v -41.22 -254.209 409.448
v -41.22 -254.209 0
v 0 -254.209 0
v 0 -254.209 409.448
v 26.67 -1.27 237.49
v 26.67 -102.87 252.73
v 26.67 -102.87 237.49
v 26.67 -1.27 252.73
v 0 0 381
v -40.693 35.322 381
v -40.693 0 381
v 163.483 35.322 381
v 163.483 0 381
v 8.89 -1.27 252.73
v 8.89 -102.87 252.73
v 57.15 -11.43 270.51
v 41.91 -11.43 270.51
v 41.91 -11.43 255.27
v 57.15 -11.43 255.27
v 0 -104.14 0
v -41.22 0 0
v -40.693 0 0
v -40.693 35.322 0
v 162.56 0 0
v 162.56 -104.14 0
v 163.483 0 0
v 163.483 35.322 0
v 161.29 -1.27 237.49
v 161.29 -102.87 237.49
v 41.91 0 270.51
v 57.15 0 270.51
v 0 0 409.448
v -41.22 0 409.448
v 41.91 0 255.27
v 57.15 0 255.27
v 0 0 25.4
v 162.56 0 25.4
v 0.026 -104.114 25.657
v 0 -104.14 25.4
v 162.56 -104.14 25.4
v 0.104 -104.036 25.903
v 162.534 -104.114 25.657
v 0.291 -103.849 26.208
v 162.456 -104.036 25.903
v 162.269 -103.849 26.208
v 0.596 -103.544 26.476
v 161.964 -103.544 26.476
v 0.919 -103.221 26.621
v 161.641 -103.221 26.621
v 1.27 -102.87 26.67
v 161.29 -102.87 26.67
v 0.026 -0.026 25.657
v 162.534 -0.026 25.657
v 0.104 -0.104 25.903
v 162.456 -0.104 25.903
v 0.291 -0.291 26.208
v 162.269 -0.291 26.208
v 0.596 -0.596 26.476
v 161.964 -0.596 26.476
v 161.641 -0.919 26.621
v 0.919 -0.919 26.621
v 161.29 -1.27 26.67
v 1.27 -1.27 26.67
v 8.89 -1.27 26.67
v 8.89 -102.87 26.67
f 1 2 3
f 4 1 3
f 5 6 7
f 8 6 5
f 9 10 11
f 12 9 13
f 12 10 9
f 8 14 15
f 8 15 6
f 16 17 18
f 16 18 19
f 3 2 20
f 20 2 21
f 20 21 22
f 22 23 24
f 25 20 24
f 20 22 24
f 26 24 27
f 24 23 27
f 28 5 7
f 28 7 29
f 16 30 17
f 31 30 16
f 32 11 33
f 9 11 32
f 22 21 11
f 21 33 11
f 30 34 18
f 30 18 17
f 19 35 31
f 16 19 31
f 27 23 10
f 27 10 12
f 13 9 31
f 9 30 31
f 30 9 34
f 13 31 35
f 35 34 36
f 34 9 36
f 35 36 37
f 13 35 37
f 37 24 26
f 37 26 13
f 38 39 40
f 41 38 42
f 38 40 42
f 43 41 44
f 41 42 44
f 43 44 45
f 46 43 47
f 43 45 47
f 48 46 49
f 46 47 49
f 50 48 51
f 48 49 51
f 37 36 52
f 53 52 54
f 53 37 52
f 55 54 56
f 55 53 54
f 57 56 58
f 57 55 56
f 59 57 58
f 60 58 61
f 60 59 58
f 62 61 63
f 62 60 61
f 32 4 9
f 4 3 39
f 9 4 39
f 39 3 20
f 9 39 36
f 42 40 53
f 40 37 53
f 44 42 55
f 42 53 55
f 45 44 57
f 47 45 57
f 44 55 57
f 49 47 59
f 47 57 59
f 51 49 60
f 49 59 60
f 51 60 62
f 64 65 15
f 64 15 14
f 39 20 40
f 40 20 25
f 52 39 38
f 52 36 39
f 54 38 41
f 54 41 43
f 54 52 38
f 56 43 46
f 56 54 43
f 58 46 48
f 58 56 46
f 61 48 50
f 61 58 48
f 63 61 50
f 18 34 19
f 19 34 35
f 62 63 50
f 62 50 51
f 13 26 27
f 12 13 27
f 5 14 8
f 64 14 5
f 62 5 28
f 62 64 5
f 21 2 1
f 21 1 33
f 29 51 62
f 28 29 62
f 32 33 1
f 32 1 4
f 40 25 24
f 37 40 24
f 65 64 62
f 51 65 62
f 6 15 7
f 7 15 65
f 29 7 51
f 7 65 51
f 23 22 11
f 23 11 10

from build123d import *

# Parameters (mm, degrees)
F0_W      = 162.56
F0_H      = 104.14
F1_DEPTH  = 26.67
F2_R      = 1.27
F3_W      = 41.2198416889
F3_H      = 254.2093396187
F4_DEPTH  = 409.448
F5_W      = 204.1760310531
F5_H      = 35.3224389255
F6_DEPTH  = 381
F7_W      = 15.24
F7_H      = 15.24
F8_DEPTH  = 11.43
F9_W      = 152.4
F9_H      = 101.6
F10_DEPTH = 226.06
F11_W     = 134.62
F11_H     = 101.6
F12_DEPTH = 15.24


with BuildPart() as f1:
    # F0 (on Top) → F1 (new body)
    with BuildSketch(Plane.XY):
        with Locations((81.28, -52.07)):
            Rectangle(F0_W, F0_H)
    extrude(amount=F1_DEPTH)

    # F2
    f2_edges = [f1.edges().sort_by_distance(p)[0] for p in [
        (81.28, 0, 26.67),
        (0, -52.07, 26.67),
        (81.28, -104.14, 26.67),
        (162.56, -52.07, 26.67),
    ]]
    fillet(f2_edges, radius=F2_R)

    # F3 (on Top) → F4 (join)
    with BuildSketch(Plane.XY):
        with Locations((-20.6099208444, -127.1046698093)):
            Rectangle(F3_W, F3_H)
    extrude(amount=F4_DEPTH)

    # F5 (on Top) → F6 (join)
    with BuildSketch(Plane.XY):
        with Locations((61.3948740065, 17.6612194628)):
            Rectangle(F5_W, F5_H)
    extrude(amount=F6_DEPTH)

    # F7 (on face) → F8 (join)
    with BuildSketch(Plane.XZ):
        with Locations((49.53, 262.89)):
            Rectangle(F7_W, F7_H)
    extrude(amount=F8_DEPTH)


with BuildPart() as f10:
    # F9 (on face) → F10 (new body)
    with BuildSketch(Plane.XY.offset(26.67)):
        with Locations((85.09, -52.07)):
            Rectangle(F9_W, F9_H)
    extrude(amount=F10_DEPTH)

    # F11 (on face) → F12 (cut)
    with BuildSketch(Plane.XY.offset(252.73)):
        with Locations((93.98, -52.07)):
            Rectangle(F11_W, F11_H)
    extrude(amount=-F12_DEPTH, mode=Mode.SUBTRACT)


solid = Compound([f1.part, f10.part])
